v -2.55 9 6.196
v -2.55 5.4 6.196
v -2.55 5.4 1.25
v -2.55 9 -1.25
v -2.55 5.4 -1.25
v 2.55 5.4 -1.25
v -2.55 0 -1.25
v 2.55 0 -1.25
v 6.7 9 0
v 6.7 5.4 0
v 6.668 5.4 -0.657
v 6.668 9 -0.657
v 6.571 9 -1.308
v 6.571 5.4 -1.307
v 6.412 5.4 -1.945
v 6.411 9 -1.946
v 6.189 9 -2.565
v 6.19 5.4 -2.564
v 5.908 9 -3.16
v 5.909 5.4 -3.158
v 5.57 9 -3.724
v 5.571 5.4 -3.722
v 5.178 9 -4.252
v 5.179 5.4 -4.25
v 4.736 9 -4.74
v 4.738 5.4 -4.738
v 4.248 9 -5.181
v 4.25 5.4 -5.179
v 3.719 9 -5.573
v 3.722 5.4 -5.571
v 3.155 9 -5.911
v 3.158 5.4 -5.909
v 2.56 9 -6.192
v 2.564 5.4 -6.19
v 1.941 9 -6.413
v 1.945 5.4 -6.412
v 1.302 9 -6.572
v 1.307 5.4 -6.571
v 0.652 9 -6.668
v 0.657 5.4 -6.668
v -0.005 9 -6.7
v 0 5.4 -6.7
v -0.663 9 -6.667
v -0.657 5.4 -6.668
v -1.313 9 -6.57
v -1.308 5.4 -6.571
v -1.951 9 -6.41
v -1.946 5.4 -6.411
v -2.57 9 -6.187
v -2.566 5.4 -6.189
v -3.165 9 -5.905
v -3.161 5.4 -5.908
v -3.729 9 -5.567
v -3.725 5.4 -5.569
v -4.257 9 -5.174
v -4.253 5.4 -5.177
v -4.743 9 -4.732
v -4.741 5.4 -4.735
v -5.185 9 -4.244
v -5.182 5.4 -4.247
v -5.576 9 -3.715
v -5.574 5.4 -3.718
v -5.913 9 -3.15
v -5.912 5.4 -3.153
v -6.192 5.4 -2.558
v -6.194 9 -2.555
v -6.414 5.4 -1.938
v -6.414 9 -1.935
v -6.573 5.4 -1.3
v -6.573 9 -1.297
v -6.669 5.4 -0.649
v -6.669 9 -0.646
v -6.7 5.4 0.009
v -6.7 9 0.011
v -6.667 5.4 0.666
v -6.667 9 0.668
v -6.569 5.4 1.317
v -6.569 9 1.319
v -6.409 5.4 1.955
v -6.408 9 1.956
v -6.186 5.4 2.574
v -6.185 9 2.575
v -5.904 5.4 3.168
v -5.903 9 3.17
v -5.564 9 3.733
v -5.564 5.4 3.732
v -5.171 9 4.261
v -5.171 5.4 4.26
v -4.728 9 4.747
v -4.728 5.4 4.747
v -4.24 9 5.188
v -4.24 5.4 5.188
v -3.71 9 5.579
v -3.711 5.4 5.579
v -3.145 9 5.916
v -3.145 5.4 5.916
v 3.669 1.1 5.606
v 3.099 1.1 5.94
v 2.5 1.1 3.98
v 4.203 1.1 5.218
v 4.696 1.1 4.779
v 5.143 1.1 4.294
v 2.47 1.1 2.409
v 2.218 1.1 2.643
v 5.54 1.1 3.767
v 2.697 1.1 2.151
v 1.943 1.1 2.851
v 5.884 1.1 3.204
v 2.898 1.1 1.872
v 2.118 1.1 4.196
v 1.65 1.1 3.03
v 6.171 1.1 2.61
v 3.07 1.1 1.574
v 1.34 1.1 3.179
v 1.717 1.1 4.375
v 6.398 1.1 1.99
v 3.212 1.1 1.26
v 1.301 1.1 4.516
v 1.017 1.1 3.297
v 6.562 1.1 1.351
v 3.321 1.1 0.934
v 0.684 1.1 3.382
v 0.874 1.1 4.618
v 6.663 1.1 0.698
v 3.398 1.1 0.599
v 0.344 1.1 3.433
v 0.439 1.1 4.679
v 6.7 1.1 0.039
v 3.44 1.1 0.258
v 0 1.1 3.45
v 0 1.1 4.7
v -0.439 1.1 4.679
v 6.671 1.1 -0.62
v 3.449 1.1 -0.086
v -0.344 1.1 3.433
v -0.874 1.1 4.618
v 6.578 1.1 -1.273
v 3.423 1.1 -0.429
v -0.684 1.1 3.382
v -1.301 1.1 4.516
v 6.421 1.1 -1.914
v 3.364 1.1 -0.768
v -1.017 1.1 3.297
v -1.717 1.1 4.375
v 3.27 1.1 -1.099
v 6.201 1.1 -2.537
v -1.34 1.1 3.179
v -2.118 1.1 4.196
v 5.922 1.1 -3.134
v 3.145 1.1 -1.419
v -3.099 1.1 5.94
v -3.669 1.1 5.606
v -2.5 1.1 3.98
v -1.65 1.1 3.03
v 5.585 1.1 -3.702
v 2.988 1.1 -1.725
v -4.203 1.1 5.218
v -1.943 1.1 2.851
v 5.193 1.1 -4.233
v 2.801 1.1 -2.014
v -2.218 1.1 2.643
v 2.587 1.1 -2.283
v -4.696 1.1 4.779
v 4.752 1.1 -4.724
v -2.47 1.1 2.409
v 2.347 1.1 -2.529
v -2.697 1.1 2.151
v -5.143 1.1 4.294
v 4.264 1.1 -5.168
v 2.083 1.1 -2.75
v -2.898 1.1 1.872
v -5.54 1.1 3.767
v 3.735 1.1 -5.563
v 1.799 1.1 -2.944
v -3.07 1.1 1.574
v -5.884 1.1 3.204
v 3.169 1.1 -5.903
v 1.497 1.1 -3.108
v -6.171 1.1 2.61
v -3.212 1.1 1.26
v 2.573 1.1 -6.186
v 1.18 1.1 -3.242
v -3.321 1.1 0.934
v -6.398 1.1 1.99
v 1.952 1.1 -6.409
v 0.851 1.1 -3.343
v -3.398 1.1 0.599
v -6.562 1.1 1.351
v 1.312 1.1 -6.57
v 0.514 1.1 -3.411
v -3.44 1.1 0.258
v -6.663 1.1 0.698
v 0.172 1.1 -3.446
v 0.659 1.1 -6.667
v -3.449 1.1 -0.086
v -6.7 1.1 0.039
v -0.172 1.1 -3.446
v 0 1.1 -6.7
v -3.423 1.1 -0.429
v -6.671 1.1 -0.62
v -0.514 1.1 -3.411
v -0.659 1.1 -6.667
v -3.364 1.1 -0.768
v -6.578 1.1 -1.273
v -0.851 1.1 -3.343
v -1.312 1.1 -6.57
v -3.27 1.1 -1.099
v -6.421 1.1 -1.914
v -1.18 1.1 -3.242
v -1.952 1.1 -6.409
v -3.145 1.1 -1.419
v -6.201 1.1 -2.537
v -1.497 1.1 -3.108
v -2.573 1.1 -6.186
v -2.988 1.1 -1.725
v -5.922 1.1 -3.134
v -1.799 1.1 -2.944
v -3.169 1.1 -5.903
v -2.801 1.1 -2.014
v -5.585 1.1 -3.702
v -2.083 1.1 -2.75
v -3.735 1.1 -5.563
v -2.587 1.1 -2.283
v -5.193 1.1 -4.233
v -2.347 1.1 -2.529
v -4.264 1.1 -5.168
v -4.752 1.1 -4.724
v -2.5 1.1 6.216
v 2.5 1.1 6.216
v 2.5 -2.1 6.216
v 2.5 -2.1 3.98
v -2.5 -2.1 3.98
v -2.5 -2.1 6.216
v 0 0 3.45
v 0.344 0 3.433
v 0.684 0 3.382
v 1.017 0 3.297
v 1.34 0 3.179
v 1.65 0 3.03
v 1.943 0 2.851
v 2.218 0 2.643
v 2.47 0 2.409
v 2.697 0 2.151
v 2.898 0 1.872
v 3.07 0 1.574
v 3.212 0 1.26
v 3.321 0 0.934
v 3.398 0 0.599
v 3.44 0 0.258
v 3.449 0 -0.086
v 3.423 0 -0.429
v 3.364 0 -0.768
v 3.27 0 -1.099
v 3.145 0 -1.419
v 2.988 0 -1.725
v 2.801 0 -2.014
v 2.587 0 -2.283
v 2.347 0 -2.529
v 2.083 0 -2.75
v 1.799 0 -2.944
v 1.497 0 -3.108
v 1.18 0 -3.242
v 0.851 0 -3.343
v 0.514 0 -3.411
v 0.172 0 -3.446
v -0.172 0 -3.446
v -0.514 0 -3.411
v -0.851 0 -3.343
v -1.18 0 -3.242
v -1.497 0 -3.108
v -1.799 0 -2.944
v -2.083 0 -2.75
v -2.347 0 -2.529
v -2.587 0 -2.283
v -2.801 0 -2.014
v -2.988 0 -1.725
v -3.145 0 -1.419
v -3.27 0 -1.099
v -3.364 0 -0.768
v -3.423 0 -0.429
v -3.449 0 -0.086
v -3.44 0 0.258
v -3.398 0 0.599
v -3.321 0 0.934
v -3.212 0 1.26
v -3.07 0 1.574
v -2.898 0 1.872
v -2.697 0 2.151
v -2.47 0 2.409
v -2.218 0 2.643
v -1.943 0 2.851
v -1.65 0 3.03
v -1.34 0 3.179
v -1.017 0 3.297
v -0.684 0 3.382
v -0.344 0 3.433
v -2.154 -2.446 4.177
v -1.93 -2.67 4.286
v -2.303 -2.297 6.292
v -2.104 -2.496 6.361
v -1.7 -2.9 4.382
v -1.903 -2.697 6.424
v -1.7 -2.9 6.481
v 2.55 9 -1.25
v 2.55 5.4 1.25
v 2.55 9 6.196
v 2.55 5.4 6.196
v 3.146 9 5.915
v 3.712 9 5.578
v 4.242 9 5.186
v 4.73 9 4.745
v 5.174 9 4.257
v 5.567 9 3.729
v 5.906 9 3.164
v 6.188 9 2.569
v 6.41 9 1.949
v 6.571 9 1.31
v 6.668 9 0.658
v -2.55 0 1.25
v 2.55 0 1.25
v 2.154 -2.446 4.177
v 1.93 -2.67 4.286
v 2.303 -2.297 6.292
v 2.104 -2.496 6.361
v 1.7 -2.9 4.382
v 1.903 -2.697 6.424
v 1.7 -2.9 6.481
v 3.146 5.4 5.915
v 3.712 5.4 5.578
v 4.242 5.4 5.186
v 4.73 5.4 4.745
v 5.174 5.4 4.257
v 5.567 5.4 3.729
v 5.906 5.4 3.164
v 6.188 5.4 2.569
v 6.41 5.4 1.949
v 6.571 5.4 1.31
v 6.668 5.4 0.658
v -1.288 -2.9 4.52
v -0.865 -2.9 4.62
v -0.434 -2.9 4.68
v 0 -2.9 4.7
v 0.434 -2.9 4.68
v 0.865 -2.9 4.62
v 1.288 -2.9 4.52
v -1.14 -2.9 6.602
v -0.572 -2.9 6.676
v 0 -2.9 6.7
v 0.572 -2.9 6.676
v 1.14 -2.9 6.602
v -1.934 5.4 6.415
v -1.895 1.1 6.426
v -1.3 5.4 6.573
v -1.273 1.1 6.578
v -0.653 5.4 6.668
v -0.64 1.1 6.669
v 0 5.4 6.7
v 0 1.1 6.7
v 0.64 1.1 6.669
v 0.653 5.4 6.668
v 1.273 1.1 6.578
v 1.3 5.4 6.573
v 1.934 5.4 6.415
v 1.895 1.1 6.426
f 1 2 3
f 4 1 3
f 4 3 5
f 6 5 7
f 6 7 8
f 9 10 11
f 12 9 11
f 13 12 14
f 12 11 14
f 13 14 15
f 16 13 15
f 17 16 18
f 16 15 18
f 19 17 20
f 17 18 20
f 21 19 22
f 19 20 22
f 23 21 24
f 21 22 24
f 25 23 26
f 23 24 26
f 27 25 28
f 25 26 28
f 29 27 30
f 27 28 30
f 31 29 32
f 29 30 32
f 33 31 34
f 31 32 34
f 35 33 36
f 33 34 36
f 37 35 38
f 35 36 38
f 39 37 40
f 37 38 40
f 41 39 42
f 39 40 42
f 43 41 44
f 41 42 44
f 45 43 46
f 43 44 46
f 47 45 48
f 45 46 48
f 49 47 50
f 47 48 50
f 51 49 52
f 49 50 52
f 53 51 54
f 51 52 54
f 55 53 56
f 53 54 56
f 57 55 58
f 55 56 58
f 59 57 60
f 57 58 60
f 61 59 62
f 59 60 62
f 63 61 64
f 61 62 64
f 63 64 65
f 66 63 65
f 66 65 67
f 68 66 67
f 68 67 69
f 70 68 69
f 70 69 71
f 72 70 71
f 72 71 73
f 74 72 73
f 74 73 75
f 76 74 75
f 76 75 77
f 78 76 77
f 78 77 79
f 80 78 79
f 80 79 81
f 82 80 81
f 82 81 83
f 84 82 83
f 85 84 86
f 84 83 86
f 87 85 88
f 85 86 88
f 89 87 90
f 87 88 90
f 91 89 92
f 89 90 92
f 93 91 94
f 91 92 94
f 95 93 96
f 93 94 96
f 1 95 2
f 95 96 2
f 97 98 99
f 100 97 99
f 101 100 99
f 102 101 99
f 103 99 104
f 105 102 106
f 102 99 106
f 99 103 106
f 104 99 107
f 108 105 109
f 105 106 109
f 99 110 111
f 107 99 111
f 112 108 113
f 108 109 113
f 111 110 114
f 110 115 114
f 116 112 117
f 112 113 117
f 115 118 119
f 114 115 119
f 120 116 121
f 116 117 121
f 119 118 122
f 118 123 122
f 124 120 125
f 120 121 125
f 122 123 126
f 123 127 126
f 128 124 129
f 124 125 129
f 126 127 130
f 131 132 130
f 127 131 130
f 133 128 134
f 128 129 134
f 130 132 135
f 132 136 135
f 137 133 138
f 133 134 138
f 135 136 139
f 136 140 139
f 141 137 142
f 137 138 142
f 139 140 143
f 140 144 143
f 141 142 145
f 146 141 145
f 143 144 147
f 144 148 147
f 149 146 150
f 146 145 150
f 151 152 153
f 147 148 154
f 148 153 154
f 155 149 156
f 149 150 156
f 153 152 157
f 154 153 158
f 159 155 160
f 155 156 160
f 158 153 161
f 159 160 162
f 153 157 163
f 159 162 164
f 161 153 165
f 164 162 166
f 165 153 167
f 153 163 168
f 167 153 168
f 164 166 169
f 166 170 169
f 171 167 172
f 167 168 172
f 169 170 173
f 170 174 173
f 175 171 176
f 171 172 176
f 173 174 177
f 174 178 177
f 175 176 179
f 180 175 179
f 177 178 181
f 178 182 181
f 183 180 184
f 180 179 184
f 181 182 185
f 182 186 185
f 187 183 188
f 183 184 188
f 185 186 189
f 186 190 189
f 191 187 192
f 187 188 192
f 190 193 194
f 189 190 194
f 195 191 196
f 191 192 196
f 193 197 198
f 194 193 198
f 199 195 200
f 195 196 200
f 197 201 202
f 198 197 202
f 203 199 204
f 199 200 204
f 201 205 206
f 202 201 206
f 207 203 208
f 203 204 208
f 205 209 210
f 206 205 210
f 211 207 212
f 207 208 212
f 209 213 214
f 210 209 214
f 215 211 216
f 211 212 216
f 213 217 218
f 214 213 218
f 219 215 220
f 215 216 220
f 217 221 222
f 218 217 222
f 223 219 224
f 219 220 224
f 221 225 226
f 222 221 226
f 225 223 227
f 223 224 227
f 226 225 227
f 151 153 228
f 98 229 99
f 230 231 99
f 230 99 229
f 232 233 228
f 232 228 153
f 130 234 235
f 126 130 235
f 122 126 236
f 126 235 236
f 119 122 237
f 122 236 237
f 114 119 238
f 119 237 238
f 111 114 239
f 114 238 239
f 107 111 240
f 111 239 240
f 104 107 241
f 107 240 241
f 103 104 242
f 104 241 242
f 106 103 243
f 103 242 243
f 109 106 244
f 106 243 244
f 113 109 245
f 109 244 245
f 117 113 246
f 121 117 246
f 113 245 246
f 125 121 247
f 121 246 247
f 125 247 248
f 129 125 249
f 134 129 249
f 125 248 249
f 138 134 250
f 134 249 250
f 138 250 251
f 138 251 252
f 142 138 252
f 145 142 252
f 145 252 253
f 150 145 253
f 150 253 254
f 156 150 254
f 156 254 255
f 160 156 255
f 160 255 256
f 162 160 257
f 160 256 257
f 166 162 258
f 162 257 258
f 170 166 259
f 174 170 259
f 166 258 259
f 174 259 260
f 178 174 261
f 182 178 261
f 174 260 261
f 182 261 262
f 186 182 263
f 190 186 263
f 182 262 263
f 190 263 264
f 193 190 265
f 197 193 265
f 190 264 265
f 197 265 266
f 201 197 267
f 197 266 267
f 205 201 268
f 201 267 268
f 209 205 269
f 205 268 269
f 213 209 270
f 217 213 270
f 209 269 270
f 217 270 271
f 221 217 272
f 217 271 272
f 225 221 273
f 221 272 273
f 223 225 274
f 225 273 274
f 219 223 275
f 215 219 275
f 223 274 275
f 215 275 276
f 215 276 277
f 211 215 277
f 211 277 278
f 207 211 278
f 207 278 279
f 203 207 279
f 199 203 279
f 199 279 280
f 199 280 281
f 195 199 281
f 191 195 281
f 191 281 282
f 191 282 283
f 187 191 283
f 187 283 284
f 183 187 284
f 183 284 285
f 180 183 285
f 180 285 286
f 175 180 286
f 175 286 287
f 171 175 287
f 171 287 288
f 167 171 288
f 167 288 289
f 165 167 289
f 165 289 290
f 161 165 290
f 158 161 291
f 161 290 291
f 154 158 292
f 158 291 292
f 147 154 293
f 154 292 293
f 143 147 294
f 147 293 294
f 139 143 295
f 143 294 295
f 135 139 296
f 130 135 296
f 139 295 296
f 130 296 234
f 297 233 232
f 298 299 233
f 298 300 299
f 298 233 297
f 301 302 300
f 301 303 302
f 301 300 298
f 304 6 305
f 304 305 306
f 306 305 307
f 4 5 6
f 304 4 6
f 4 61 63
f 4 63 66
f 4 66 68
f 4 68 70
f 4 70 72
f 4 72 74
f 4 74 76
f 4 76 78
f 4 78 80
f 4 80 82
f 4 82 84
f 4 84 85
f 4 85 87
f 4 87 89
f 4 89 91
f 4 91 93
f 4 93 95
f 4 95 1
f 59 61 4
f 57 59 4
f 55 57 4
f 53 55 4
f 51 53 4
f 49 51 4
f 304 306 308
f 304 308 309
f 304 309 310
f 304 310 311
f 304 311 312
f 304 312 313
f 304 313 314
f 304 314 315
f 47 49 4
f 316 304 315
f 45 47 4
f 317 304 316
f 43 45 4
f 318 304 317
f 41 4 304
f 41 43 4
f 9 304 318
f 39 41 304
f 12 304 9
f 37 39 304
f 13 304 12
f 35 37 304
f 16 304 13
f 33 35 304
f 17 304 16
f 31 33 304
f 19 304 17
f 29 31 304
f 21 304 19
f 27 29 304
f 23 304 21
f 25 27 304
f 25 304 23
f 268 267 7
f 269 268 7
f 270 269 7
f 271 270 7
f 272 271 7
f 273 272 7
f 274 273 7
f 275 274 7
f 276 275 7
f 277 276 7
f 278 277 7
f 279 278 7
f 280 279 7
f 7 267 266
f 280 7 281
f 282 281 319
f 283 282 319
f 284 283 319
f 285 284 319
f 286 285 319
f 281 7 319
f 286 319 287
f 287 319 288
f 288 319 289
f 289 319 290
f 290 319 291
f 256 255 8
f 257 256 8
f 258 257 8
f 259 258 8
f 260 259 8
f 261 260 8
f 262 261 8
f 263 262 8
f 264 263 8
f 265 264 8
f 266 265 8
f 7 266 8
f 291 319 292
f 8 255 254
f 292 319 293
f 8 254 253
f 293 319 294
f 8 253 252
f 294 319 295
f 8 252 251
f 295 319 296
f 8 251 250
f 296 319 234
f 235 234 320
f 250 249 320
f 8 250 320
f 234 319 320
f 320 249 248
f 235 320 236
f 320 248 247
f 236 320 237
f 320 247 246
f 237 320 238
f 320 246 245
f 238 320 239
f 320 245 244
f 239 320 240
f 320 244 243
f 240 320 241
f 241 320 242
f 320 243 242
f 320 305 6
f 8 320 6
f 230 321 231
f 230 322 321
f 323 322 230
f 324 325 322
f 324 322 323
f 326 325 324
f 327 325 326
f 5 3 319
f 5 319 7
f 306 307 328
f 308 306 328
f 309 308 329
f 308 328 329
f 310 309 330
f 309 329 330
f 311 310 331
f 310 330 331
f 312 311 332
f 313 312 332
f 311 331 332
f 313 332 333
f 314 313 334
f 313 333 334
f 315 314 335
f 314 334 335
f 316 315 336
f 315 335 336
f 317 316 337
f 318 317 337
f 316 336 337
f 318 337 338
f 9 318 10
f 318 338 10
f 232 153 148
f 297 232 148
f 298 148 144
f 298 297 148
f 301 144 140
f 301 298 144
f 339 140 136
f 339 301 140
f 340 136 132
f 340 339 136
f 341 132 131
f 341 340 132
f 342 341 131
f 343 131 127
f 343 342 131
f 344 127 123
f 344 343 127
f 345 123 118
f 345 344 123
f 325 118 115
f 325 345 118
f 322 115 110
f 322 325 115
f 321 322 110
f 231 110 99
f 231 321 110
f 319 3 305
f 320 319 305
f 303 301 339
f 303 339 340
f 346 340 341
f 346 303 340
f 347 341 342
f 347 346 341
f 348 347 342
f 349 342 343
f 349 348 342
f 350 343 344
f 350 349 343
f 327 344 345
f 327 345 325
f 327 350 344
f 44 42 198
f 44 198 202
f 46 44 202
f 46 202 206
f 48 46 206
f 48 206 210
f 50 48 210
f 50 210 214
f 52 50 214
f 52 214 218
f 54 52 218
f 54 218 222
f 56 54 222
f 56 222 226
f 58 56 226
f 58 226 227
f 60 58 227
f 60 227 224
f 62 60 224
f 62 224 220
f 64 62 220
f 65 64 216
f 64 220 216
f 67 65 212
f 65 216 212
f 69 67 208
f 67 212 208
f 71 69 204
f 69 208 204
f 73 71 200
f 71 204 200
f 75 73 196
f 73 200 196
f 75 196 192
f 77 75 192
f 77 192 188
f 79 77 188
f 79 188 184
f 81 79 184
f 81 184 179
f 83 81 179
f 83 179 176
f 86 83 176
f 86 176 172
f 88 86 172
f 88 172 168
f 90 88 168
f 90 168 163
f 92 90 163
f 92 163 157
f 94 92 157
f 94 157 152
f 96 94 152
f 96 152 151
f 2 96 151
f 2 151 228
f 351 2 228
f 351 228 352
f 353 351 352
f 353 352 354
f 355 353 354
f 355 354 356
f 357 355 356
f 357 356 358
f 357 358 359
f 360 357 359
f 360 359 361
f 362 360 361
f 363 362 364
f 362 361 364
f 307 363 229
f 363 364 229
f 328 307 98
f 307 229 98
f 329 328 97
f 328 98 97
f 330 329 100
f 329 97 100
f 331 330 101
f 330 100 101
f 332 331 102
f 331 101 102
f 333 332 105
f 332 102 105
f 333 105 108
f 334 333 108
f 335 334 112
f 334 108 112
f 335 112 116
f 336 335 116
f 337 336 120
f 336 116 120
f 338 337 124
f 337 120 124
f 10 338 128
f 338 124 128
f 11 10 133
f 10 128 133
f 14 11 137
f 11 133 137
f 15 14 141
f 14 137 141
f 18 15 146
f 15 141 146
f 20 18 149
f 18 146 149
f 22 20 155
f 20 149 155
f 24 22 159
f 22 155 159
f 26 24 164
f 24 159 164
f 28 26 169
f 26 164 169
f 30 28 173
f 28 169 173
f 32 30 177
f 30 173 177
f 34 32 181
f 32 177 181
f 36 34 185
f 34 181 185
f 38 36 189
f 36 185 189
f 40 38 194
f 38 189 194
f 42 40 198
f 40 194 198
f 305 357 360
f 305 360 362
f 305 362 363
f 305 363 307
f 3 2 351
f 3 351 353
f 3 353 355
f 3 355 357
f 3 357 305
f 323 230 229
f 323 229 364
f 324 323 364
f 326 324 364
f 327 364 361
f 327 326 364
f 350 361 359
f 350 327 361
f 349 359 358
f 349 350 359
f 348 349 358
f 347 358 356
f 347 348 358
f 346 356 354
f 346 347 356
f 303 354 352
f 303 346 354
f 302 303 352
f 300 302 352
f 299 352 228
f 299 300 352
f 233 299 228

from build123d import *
from build123d.topology import SkipClean

# Parameters (mm, degrees)
SKETCH1_R           = 3.45
BOSS_EXTRUDE1_DEPTH = 1.1
SKETCH2_R           = 6.7
BOSS_EXTRUDE2_DEPTH = 4.3
SKETCH3_W           = 5.1
SKETCH3_H           = 2.5
CUT_EXTRUDE1_DEPTH  = 11.905961672
BOSS_EXTRUDE3_START = 4
BOSS_EXTRUDE3_DEPTH = 4
CHAMFER1_SIZE       = 0.8
BOSS_EXTRUDE4_DEPTH = 3.6


with BuildPart() as part:
    # Sketch1 → Boss-Extrude1 (new body)
    with BuildSketch(Plane(origin=(0, 0, 0), x_dir=(1, 0, 0), z_dir=(0, 1, 0))):
        with Locations(Location((0, 0, 0), (0, 0, 270))):
            Circle(SKETCH1_R)
    extrude(amount=BOSS_EXTRUDE1_DEPTH)

    # Sketch2 → Boss-Extrude2 (add)
    with BuildSketch(Plane(origin=(0, 1.1, 0), x_dir=(1, 0, 0), z_dir=(0, 1, 0))):
        with Locations(Location((0, 0, 0), (0, 0, 90))):
            Circle(SKETCH2_R)
    extrude(amount=BOSS_EXTRUDE2_DEPTH)

    # Sketch3 → Cut-Extrude1 (cut, through all)
    with BuildSketch(Plane(origin=(0, 5.4, 0), x_dir=(1, 0, 0), z_dir=(0, 1, 0))):
        Rectangle(SKETCH3_W, SKETCH3_H)
    extrude(amount=-CUT_EXTRUDE1_DEPTH, mode=Mode.SUBTRACT)

    # Sketch4 → Boss-Extrude3 (add)
    with SkipClean():  # the faces are left unmerged after this step: merging them gives an invalid solid
        with BuildSketch(Plane.XZ.offset(-1.1).offset(BOSS_EXTRUDE3_START)):
            with BuildLine():
                ThreePointArc((2.5, 6.216108107), (0, 6.7), (-2.5, 6.216108107))
                Line((-2.5, 6.216108107), (-2.5, 3.979949748))
                ThreePointArc((-2.5, 3.979949748), (0, 4.7), (2.5, 3.979949748))
                Line((2.5, 3.979949748), (2.5, 6.216108107))
            make_face()
        extrude(amount=-BOSS_EXTRUDE3_DEPTH)

    # Chamfer1
    chamfer1_edges = [part.edges().sort_by_distance(p)[0] for p in [
        (-2.5, -2.9, 5.098028928),
        (2.5, -2.9, 5.098028928),
    ]]
    chamfer(chamfer1_edges, length=CHAMFER1_SIZE)

    # Sketch5 → Boss-Extrude4 (add)
    with SkipClean():  # the faces are left unmerged after this step: merging them gives an invalid solid
        with BuildSketch(Plane(origin=(0, 5.4, 0), x_dir=(1, 0, 0), z_dir=(0, 1, 0))):
            with BuildLine():
                Line((-2.55, -1.25), (-2.55, 1.25))
                Line((-2.55, 1.25), (2.55, 1.25))
                Line((2.55, 1.25), (2.55, -1.25))
                Line((2.55, -1.25), (2.55, -6.195764682))
                ThreePointArc((2.55, -6.195764682), (5.566641717, -3.728605638), (6.7, 0))
                ThreePointArc((6.7, 0), (-3.728605638, 5.566641717), (-2.55, -6.195764682))
                Line((-2.55, -6.195764682), (-2.55, -1.25))
            make_face()
        extrude(amount=BOSS_EXTRUDE4_DEPTH)


solid = part.part
